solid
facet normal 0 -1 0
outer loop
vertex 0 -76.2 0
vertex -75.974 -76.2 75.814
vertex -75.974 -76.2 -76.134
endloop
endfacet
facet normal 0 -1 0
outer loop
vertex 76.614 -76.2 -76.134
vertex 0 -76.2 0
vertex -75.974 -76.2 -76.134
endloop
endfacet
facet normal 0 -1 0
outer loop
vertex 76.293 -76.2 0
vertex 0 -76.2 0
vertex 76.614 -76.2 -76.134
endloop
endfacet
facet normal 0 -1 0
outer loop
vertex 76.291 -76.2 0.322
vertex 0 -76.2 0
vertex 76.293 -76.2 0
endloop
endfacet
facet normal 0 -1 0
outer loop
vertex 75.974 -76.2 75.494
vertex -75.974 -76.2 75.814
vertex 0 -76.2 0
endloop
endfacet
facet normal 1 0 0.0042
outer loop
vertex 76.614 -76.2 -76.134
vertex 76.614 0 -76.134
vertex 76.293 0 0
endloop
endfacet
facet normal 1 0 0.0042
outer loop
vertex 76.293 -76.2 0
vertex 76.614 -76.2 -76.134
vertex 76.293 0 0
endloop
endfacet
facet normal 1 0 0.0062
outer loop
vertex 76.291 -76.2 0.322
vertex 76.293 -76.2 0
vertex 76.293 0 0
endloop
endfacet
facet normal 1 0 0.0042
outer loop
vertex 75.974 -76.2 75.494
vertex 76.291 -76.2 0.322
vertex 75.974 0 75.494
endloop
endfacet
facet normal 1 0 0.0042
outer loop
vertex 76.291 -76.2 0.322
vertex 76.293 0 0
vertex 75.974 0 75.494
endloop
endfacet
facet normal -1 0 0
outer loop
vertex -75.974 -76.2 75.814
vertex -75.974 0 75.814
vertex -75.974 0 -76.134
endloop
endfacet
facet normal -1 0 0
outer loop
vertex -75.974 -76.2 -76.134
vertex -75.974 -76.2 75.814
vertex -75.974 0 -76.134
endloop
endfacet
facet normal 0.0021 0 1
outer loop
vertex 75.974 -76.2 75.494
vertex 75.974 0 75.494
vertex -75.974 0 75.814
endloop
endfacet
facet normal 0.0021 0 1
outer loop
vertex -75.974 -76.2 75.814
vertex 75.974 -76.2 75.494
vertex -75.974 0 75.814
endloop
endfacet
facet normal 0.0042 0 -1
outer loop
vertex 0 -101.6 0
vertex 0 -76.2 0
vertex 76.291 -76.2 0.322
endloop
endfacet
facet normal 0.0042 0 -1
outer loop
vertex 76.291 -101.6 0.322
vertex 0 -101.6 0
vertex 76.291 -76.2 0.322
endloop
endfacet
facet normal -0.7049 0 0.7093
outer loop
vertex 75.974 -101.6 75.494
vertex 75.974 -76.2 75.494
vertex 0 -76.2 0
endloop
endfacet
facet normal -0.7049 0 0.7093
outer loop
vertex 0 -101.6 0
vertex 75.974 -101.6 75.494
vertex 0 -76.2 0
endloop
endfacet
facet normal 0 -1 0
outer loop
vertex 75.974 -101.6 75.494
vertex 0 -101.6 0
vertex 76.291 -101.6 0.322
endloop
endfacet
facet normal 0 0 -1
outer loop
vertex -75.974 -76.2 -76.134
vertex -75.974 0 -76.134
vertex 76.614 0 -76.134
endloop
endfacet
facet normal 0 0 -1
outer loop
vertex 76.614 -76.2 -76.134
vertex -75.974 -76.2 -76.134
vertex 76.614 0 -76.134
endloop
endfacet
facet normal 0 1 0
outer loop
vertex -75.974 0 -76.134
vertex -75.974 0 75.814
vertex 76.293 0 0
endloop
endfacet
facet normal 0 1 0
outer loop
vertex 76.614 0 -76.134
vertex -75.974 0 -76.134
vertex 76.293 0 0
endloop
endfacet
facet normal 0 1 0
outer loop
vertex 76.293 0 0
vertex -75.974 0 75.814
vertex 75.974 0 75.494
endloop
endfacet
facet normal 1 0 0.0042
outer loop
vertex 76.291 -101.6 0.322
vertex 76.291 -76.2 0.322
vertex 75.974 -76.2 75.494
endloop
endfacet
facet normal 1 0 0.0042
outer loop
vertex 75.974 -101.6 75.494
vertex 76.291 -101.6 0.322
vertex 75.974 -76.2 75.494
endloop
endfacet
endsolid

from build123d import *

# Parameters (mm, degrees)
F1_DEPTH = 76.2
F3_DEPTH = 25.4


with BuildPart() as f1:
    # F0 (on Front) → F1 (new body)
    with BuildSketch(Plane.XZ):
        Polygon((-75.97407, 0), (0, 0), (76.292614, 0), (75.974077, 75.49423), (-75.97407, 75.814128), align=None)
        Polygon((76.292614, 0), (0, 0), (-75.97407, 0), (-75.97407, -76.134019), (76.613851, -76.134019), align=None)
    extrude(amount=F1_DEPTH)

    # F2 (on face) → F3 (join)
    with BuildSketch(Plane.XZ.offset(76.2)):
        Polygon((75.974077, 75.49423), (0, 0), (76.291256, 0.3219), align=None)
    extrude(amount=F3_DEPTH)


solid = f1.part
